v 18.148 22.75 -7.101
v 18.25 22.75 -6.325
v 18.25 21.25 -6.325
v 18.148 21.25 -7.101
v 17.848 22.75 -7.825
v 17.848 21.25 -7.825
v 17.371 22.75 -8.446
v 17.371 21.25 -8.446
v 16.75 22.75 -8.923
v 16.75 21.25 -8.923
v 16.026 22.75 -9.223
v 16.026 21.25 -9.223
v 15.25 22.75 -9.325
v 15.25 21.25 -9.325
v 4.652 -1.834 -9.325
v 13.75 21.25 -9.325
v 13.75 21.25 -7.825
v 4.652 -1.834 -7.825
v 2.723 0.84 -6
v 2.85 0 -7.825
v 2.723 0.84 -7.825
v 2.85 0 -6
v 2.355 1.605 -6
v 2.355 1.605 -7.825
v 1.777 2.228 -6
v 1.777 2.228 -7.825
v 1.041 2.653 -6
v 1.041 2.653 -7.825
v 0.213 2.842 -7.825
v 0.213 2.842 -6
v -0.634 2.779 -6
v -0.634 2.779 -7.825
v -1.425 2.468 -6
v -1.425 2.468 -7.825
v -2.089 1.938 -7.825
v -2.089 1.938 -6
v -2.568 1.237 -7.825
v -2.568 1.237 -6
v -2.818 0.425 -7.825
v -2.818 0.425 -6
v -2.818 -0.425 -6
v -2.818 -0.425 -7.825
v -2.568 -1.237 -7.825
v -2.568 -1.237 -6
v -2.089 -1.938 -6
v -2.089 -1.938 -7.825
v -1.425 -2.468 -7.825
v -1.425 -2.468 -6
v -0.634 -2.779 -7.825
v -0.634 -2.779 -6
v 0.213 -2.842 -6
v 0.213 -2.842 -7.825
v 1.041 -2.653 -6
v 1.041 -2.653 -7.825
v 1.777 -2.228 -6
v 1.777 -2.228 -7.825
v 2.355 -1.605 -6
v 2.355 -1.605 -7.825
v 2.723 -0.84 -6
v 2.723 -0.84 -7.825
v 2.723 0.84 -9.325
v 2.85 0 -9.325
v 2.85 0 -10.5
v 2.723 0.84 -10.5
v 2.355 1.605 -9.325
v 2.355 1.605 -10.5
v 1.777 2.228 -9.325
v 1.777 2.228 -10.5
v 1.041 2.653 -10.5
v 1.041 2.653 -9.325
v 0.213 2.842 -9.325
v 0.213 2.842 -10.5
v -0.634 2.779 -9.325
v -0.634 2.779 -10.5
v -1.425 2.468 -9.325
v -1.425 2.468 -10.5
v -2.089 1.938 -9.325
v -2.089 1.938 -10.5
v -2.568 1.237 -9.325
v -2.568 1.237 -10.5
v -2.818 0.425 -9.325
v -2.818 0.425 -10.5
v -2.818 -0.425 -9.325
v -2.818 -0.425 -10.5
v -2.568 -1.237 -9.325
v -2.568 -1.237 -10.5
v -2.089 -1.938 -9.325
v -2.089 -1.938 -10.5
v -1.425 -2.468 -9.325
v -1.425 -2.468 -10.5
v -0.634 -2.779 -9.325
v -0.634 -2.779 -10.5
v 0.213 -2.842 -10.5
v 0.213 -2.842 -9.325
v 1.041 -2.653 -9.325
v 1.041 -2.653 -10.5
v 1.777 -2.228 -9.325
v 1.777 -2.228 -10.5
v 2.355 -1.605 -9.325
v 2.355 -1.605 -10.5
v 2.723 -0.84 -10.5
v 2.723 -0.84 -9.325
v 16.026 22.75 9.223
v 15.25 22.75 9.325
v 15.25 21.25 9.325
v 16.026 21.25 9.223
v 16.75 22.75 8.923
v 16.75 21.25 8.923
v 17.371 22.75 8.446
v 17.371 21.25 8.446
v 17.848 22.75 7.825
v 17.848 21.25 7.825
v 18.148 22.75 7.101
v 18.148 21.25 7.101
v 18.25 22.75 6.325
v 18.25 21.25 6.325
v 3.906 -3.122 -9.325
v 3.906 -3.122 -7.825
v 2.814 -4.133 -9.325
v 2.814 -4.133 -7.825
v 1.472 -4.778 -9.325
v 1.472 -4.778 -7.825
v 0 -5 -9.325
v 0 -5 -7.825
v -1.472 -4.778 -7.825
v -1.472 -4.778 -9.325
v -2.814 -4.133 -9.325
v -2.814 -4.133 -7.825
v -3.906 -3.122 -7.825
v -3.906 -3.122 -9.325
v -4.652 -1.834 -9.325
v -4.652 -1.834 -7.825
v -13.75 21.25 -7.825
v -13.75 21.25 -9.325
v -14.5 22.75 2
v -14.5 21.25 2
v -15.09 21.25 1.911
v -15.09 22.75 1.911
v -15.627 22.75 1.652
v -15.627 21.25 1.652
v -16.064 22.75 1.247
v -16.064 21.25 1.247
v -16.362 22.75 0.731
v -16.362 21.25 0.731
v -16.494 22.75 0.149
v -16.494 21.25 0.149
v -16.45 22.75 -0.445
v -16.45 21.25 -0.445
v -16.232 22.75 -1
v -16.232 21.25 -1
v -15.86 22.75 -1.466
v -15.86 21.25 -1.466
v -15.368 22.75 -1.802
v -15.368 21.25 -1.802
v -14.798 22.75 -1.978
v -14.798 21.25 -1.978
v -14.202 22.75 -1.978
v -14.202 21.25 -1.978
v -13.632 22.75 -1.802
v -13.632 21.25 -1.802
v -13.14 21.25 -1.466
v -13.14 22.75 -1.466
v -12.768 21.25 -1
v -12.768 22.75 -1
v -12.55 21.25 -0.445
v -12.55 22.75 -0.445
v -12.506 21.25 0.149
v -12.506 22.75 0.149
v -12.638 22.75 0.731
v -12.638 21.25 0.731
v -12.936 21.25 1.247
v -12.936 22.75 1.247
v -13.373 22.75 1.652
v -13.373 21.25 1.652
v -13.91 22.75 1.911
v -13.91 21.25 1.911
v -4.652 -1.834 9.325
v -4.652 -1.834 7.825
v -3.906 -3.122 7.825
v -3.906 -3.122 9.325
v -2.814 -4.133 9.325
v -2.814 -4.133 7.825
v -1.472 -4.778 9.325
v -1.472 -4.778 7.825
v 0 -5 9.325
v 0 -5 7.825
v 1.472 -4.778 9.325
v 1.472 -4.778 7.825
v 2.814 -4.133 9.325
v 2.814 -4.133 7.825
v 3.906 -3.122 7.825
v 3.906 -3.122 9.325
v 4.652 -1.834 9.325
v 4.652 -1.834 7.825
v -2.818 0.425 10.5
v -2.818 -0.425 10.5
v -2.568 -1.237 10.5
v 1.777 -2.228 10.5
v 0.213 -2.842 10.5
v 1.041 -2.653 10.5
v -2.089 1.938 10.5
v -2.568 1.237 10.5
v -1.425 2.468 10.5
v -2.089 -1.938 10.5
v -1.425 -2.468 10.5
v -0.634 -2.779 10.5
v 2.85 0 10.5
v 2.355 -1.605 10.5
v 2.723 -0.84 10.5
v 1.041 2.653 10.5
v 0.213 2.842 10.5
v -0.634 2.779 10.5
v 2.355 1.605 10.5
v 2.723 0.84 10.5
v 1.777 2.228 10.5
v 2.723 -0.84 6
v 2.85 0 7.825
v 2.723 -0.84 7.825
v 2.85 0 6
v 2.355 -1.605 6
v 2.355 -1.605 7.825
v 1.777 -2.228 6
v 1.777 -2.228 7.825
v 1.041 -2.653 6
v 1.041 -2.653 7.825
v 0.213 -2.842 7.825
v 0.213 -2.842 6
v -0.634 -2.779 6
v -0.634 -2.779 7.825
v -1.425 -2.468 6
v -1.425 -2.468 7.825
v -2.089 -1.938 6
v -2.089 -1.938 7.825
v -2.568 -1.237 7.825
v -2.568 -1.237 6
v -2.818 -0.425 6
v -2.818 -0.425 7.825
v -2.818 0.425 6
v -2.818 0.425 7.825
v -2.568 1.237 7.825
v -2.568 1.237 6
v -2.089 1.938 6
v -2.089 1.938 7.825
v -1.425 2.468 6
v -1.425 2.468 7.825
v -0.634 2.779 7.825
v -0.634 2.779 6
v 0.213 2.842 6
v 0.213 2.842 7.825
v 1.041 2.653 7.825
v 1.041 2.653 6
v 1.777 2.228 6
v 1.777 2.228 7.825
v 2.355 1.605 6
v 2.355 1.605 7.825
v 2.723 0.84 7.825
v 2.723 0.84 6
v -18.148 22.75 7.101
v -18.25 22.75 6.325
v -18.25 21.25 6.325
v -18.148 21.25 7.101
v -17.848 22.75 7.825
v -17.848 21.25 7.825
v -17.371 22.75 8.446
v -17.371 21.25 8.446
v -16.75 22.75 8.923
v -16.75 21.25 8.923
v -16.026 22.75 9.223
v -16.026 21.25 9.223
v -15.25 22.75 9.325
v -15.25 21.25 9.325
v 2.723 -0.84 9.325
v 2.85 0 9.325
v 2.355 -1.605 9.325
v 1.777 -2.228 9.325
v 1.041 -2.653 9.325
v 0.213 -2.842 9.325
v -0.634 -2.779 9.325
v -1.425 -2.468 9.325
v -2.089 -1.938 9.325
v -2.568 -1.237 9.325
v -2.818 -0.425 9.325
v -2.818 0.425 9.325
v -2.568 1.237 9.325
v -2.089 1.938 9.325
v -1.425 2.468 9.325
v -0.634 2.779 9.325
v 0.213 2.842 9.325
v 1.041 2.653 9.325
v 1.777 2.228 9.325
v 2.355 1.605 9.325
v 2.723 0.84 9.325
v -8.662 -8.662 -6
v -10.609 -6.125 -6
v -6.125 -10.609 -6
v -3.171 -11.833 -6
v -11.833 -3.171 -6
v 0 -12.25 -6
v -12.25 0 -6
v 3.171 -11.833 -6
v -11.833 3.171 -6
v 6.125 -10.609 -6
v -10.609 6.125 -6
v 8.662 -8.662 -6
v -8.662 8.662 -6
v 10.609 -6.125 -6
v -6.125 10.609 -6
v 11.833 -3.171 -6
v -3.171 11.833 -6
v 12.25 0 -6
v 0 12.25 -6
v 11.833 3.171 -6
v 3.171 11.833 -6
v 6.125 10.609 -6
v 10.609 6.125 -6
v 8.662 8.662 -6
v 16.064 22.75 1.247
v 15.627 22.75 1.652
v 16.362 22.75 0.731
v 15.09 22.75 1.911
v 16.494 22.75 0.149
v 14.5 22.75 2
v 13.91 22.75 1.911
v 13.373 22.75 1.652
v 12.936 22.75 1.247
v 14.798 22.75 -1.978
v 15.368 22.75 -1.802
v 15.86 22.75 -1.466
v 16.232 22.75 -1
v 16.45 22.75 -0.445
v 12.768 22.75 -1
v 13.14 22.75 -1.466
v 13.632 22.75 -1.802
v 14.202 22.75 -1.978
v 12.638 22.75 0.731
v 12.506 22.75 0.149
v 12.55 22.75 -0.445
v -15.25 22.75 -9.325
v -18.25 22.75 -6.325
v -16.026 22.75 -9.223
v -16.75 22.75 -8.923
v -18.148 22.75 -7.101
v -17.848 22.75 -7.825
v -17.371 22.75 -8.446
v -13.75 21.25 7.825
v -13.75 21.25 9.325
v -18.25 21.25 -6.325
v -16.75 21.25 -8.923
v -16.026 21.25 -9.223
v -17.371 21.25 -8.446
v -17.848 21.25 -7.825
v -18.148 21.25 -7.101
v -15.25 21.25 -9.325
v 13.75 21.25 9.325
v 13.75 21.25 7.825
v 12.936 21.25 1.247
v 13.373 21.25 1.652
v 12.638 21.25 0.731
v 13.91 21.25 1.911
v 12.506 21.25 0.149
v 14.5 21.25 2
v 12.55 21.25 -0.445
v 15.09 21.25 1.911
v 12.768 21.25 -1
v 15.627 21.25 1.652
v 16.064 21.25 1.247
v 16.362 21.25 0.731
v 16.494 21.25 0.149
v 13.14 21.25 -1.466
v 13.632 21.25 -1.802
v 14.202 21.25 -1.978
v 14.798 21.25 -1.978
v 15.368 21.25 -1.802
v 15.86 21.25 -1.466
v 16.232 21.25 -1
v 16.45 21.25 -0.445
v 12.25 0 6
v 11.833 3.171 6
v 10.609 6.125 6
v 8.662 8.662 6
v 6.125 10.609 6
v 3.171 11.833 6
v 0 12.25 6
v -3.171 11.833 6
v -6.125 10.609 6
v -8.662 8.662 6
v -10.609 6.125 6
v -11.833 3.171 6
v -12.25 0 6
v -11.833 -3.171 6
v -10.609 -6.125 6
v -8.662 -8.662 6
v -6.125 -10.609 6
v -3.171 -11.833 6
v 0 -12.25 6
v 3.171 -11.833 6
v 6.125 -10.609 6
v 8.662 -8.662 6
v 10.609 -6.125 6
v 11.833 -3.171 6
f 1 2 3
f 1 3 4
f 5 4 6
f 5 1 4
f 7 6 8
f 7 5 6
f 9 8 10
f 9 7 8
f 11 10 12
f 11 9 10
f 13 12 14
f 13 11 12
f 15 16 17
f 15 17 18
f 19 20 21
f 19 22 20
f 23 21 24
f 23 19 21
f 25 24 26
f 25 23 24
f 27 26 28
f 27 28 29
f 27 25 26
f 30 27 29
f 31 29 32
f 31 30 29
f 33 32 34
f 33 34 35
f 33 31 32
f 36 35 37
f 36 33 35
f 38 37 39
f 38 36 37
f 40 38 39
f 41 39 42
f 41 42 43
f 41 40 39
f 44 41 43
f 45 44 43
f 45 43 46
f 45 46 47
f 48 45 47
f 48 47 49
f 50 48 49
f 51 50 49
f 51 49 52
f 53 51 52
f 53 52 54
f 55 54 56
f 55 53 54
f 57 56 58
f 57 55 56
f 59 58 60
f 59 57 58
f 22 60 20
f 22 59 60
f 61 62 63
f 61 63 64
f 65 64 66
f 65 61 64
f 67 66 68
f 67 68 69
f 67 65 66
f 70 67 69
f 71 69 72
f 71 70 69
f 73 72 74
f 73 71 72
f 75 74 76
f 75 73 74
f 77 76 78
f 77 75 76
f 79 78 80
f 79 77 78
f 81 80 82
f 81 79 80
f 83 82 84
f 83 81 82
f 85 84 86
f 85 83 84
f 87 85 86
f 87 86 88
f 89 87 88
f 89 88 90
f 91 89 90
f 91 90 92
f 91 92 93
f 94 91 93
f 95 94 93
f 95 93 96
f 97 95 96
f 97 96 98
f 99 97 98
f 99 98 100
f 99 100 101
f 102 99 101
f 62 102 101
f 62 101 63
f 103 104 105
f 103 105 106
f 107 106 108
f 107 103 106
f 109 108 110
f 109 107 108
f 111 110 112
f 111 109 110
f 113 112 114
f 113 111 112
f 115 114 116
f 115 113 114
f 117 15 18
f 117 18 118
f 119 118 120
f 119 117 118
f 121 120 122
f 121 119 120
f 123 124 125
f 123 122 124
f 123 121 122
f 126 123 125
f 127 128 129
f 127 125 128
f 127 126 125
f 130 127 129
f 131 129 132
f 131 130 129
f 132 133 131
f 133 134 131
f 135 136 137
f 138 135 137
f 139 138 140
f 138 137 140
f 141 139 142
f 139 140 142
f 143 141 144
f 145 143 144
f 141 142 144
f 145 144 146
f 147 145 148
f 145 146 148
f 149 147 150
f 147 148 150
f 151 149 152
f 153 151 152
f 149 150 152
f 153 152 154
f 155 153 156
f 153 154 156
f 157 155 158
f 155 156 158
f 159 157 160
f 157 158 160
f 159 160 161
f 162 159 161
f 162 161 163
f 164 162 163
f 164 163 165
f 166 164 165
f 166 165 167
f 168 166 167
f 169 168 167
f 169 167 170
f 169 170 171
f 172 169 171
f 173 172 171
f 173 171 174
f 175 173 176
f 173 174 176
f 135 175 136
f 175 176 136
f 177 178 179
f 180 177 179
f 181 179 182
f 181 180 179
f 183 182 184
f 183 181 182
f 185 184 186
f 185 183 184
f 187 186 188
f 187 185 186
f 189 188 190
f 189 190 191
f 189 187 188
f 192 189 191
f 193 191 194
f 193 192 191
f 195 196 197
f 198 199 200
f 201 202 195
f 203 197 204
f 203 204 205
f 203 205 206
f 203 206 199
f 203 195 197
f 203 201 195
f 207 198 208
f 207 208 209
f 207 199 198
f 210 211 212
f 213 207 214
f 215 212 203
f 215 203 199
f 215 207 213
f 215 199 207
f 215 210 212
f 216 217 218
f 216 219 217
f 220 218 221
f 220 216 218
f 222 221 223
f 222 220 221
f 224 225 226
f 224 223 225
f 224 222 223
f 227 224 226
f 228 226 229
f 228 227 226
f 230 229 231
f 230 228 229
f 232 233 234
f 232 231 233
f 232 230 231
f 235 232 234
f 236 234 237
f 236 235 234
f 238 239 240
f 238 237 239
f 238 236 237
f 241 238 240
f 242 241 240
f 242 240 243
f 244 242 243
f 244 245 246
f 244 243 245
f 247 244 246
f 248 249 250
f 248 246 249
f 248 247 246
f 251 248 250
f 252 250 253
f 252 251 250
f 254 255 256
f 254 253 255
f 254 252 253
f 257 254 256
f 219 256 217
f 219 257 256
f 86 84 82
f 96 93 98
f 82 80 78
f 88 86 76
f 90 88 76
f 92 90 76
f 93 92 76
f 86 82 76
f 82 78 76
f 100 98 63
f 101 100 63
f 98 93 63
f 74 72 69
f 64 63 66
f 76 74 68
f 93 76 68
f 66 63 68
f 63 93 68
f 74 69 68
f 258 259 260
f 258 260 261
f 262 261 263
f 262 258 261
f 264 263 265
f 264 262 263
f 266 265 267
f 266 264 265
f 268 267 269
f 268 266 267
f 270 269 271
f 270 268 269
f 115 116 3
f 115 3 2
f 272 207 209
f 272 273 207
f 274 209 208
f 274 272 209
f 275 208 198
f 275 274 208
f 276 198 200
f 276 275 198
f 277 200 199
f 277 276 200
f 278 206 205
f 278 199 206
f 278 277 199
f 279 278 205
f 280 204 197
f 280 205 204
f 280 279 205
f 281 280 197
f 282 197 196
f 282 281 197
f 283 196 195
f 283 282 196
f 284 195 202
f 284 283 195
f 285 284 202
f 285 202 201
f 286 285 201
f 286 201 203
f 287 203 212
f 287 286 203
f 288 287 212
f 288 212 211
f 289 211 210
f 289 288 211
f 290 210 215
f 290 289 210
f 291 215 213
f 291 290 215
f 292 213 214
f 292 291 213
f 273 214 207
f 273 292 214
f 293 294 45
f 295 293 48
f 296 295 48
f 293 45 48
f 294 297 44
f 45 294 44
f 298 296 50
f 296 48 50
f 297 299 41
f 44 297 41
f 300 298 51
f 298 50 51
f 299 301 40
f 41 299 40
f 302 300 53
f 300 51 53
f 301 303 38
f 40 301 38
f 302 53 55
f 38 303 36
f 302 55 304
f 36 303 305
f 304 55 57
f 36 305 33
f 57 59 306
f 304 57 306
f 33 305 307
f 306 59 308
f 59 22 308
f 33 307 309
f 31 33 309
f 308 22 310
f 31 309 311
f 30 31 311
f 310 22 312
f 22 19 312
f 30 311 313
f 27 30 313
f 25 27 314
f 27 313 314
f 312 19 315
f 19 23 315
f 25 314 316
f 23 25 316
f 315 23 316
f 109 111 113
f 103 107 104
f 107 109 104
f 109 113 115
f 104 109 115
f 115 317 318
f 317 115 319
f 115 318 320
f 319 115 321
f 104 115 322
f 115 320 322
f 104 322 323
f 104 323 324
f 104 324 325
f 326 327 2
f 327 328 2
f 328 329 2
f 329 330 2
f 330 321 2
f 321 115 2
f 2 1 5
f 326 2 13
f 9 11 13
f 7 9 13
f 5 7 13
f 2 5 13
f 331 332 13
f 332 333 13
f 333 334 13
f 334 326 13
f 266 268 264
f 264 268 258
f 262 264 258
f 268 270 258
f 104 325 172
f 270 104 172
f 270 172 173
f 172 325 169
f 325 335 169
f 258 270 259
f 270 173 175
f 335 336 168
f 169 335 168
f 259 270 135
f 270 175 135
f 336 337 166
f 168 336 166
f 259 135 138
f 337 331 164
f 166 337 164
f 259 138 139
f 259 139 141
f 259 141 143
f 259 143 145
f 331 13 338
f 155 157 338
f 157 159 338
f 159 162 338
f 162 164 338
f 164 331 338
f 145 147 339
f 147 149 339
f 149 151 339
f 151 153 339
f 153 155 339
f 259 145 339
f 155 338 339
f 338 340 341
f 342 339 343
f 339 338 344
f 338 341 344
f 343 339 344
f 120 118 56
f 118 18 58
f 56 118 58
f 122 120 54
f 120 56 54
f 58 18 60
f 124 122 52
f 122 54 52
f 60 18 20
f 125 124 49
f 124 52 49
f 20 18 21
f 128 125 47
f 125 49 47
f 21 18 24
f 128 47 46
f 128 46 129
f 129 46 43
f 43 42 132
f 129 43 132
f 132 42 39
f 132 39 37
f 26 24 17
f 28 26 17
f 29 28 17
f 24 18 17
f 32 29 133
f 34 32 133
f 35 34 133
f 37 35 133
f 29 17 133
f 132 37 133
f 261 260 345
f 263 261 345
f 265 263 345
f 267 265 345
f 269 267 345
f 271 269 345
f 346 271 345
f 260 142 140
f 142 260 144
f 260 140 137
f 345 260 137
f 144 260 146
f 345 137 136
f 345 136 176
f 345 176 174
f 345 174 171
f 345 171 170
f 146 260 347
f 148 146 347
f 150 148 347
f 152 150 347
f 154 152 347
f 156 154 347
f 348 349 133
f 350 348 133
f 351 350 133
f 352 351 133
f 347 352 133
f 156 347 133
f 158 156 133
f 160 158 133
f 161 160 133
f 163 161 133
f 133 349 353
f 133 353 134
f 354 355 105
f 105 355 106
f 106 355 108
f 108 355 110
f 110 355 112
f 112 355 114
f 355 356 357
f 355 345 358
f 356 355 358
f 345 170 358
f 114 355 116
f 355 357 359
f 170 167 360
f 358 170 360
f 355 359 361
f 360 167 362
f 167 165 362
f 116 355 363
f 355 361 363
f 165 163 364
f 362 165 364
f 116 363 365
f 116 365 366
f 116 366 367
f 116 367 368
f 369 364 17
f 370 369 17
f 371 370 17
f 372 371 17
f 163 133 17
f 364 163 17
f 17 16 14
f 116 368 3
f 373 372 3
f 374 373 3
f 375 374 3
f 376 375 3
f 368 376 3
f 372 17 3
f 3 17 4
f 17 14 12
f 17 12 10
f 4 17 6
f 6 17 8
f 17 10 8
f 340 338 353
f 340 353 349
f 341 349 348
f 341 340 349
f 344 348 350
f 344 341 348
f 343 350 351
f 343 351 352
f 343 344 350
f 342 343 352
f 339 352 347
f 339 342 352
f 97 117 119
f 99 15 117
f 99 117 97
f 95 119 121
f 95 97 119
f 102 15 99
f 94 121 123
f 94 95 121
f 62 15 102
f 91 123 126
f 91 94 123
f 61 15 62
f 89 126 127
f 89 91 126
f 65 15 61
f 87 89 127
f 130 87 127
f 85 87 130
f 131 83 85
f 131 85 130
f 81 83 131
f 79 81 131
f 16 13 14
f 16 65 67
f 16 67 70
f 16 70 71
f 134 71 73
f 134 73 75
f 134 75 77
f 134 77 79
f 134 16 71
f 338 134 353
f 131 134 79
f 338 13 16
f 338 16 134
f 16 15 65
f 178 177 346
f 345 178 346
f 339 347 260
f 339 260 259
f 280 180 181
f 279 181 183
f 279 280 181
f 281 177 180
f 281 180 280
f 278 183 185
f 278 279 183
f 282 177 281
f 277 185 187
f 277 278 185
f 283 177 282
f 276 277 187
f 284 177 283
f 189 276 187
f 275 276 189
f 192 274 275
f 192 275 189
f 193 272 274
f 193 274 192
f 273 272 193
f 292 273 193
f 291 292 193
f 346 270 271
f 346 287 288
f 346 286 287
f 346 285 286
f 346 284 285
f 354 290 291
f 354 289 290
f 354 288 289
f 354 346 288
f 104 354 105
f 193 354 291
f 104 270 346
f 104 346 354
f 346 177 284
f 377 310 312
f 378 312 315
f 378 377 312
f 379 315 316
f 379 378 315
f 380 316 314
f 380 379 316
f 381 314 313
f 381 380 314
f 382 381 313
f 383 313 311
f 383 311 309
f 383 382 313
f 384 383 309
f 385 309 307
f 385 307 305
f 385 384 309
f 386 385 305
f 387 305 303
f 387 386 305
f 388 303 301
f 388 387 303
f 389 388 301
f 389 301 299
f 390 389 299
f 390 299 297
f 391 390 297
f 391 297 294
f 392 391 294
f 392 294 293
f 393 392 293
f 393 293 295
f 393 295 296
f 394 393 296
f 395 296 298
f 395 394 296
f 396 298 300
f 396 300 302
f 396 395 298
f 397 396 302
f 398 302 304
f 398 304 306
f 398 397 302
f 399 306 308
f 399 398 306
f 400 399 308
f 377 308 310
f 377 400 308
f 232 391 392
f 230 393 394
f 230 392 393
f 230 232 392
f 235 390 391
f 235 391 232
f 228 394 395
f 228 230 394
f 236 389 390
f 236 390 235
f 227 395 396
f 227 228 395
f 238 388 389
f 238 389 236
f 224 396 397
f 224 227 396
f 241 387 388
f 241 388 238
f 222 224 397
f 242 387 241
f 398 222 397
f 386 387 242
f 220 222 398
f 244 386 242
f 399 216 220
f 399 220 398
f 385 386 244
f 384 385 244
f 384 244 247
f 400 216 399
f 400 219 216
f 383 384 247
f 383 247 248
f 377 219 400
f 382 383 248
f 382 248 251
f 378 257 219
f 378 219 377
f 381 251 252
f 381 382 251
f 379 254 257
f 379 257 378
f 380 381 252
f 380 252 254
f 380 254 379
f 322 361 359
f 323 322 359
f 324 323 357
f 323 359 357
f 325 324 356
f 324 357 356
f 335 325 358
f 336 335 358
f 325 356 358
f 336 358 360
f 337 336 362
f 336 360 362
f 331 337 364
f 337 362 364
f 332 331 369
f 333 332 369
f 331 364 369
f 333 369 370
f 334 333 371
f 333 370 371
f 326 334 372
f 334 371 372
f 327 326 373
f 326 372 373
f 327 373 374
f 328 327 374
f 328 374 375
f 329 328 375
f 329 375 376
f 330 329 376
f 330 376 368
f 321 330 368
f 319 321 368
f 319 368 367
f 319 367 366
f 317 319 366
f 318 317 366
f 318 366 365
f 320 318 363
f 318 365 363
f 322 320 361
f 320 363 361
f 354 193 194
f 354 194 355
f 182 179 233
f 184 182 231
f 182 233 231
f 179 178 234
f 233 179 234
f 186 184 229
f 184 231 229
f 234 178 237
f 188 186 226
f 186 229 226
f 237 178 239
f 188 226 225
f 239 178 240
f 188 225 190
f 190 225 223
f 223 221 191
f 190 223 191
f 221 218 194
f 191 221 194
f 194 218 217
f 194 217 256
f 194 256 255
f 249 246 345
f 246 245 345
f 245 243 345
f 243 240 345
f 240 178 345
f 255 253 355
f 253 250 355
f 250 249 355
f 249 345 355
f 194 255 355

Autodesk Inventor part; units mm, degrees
ref_plane "YZ Plane" through (0, 0, 0) normal (1, 0, 0) x (0, 1, 0)
ref_plane "XZ Plane" through (0, 0, 0) normal (0, 1, 0) x (-1, 0, 0)
ref_plane "XY Plane" through (0, 0, 0) normal (0, 0, 1) x (1, 0, 0)
sketch "スケッチ1" plane through (0, 0, 0) normal (0, 0, 1) x (1, 0, 0)
  circle A0 centre (0, 0) radius 12.25
  circle A1 centre (0, 0) radius 2.85
  circle A2 centre (0, 0) radius 5
  line L0 (4.6517, -1.8335) -> (13.75, 21.25)
  line L1 (0, 0) -> (0, -12.25) construction
  line L2 (0, 21.25) -> (18.25, 21.25)
  line L3 (18.25, 21.25) -> (18.25, 22.75)
  line L4 (18.25, 22.75) -> (0, 22.75)
  line L5 (0, 22.75) -> (0, 21.25)
  line L6 (-4.6517, -1.8335) -> (-13.75, 21.25)
  line L7 (0, 21.25) -> (-18.25, 21.25)
  line L8 (-18.25, 21.25) -> (-18.25, 22.75)
  line L9 (-18.25, 22.75) -> (0, 22.75)
  dimension "d0" = 24.5
  dimension "d2" = 10
  dimension "d1" = 5.7
  dimension "d4" = 1.5
  dimension "d5" = 4.5
  dimension "d6" = 35
  dimension "d7" = 18.25
extrude "押し出し1" add sketch "スケッチ1" along normal mid plane 12 contours A0 L6 A2 L0 | L0 A2 L6 A0 | A2
extrude "押し出し2" add sketch "スケッチ1" along normal mid plane 21 contours A1
extrude "押し出し3" add sketch "スケッチ1" along normal mid plane 18.65 contours L2 L5 L4 L3 | L7 L8 L9 L5
extrude "押し出し4" add sketch "スケッチ1" against normal blind 1.5 from surface at 9.325 contours L0 A2 L6 A0 | A0 L6 L7 L2 L0 | A2 picked at (-6.2807, 7.4899)
mirror "ミラー1" about plane through (0, 0, 0) normal (0, 0, 1) of "押し出し4"
sketch "スケッチ2" plane through (-18.25, 22.75, -9.325) normal (0, 1, 0) x (1, 0, 0)
  line L0 (36.5, 0) -> (36.5, -18.65) projected
  line L1 (0, 0) -> (36.5, 0) projected
  line L2 (0, -18.65) -> (0, 0) projected
  line L3 (36.5, -18.65) -> (0, -18.65) projected
  line L4 (0, -9.325) -> (36.5, -9.325)
  line L5 (18.25, 0) -> (18.25, -18.65)
  point P0 (18.25, -9.325)
  point P1 (32.75, -9.325)
  point P2 (3.75, -9.325)
  dimension "d25" = 29
hole "穴1" at (14.5, 22.75, 0) at (-14.5, 22.75, 0) direction (0, -1, 0) diameter 4 end through all
fillet "フィレット1" radius 3 4 edges at (-18.25, 22, -9.325) (-18.25, 22, 9.325) (18.25, 22, 9.325) (18.25, 22, -9.325)
properties part number "caster"
